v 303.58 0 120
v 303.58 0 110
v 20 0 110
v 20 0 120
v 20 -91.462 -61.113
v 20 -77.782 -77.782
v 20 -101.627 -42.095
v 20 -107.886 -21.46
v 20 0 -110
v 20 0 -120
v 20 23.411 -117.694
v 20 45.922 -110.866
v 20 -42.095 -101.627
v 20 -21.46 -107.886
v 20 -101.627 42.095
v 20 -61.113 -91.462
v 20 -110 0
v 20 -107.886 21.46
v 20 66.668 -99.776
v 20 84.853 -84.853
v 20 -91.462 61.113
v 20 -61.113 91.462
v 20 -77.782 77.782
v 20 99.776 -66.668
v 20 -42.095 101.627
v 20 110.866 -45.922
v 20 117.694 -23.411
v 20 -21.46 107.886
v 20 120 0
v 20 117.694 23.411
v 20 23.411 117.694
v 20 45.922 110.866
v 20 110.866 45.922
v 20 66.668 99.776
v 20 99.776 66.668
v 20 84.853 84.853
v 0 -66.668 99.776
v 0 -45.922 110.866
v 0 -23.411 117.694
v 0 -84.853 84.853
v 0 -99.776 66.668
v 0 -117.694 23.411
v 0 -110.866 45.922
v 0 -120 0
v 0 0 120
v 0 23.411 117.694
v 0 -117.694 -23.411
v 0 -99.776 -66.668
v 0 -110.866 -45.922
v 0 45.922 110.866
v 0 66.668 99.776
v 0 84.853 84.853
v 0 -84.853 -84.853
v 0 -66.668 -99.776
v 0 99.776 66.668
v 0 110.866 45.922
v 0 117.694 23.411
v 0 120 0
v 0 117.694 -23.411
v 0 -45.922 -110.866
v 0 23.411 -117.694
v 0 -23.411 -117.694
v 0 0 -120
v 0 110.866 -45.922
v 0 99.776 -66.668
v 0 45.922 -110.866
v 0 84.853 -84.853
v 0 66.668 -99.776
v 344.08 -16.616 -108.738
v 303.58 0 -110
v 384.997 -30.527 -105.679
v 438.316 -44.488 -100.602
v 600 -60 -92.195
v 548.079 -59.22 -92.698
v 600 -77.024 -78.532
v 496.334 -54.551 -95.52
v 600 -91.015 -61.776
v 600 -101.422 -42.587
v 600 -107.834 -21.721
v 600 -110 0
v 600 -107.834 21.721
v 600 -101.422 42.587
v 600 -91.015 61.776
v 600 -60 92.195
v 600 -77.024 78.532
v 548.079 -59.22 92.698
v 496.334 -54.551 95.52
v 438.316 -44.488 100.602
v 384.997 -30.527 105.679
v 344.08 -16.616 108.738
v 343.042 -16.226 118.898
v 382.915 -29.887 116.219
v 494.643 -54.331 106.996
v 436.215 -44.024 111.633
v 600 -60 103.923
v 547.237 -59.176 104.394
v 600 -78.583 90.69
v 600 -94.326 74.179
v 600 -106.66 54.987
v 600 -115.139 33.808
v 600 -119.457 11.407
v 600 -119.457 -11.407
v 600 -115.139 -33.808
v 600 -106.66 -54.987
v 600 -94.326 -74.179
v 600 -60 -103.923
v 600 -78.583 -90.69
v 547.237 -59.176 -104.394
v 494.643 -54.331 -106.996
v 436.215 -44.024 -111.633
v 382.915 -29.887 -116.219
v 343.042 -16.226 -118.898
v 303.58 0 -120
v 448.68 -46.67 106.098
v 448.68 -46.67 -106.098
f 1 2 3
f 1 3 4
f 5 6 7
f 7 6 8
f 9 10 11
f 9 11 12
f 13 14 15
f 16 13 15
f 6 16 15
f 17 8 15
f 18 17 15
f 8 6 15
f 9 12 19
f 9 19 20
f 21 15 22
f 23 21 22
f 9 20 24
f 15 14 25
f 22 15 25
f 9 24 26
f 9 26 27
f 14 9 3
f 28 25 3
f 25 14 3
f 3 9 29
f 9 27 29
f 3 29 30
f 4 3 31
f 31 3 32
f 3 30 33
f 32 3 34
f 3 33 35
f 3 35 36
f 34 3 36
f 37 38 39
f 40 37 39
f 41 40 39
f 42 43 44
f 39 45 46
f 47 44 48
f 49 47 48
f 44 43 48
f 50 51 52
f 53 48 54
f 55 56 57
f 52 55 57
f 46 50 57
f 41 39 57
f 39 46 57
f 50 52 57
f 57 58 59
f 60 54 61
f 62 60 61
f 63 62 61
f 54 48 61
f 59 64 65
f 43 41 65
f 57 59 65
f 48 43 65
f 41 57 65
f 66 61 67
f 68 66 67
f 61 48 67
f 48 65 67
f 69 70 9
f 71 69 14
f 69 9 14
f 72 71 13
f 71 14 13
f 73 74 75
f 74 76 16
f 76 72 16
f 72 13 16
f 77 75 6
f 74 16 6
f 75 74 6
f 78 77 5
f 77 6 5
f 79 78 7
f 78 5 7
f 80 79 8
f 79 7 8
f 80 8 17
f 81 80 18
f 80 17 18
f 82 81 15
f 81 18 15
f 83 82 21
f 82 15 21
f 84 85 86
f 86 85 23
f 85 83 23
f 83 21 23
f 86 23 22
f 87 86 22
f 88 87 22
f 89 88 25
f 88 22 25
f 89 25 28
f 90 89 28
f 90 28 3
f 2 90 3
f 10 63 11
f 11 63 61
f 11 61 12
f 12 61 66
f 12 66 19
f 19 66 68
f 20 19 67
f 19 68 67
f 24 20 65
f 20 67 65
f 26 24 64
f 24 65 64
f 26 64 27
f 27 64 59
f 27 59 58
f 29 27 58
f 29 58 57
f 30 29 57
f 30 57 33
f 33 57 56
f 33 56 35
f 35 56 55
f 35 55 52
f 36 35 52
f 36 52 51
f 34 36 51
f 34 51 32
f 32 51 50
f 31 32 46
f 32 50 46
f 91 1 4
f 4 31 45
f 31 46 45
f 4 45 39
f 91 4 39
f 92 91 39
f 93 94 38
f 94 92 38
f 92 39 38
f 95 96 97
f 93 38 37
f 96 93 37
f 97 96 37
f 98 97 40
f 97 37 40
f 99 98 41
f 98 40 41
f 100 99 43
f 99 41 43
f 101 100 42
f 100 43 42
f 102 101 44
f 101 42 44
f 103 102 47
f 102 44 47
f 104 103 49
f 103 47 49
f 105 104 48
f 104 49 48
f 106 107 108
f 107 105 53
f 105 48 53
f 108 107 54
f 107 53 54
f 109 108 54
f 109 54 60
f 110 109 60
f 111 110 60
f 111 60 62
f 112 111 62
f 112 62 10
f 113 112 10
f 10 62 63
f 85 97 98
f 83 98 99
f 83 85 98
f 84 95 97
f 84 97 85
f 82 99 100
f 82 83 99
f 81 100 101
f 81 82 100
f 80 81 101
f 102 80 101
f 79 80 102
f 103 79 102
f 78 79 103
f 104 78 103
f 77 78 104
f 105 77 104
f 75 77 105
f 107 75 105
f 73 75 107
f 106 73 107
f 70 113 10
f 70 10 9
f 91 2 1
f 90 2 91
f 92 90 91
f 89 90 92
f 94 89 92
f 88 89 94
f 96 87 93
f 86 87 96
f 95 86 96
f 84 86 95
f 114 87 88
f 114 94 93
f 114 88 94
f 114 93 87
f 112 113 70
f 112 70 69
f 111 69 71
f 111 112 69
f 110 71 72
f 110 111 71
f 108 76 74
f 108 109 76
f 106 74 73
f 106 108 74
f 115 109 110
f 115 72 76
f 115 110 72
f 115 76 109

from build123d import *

# Parameters (mm, degrees)
SKETCH1_R               = 120
BOSS_EXTRUDE1_DEPTH     = 600
CUT_EXTRUDE1_START      = -580
CUT_EXTRUDE1_DEPTH      = 580
CUT_EXTRUDE3_DEPTH      = 624.538290725
CUT_EXTRUDE3_DEPTH_BACK = 624.538290725


with BuildPart() as part:
    # Sketch1 → Boss-Extrude1 (new body)
    with BuildSketch(Plane(origin=(0, 0, 0), x_dir=(0, 0, -1), z_dir=(1, 0, 0))):
        Circle(SKETCH1_R)
    extrude(amount=BOSS_EXTRUDE1_DEPTH)

    # Sketch2 → Cut-Extrude1 (cut)
    with BuildSketch(Plane(origin=(600, 0, 0), x_dir=(0, 0, -1), z_dir=(1, 0, 0)).offset(CUT_EXTRUDE1_START)):
        with BuildLine():
            Line((-110, 0), (-120, 0))
            ThreePointArc((-120, 0), (0, 120), (120, 0))
            Line((120, 0), (110, 0))
            ThreePointArc((110, 0), (0, -110), (-110, 0))
        make_face()
    extrude(amount=CUT_EXTRUDE1_DEPTH, mode=Mode.SUBTRACT)

    # Sketch5 → Cut-Extrude3 (cut, two sides: drawn at the far end of the back side and taken through both)
    with BuildSketch(Plane.XY.offset(-CUT_EXTRUDE3_DEPTH_BACK)):
        with BuildLine():
            Line((303.579878798, 0), (600, 0))
            Line((600, 0), (600, -60))
            add(Edge.make_bspline(
                [(303.579878798, 0), (445.56940812, -63.340252394), (600, -60)],
                knots=[0, 0, 0, 1, 1, 1], degree=2))
        make_face()
    extrude(amount=CUT_EXTRUDE3_DEPTH + CUT_EXTRUDE3_DEPTH_BACK, mode=Mode.SUBTRACT)


solid = part.part
